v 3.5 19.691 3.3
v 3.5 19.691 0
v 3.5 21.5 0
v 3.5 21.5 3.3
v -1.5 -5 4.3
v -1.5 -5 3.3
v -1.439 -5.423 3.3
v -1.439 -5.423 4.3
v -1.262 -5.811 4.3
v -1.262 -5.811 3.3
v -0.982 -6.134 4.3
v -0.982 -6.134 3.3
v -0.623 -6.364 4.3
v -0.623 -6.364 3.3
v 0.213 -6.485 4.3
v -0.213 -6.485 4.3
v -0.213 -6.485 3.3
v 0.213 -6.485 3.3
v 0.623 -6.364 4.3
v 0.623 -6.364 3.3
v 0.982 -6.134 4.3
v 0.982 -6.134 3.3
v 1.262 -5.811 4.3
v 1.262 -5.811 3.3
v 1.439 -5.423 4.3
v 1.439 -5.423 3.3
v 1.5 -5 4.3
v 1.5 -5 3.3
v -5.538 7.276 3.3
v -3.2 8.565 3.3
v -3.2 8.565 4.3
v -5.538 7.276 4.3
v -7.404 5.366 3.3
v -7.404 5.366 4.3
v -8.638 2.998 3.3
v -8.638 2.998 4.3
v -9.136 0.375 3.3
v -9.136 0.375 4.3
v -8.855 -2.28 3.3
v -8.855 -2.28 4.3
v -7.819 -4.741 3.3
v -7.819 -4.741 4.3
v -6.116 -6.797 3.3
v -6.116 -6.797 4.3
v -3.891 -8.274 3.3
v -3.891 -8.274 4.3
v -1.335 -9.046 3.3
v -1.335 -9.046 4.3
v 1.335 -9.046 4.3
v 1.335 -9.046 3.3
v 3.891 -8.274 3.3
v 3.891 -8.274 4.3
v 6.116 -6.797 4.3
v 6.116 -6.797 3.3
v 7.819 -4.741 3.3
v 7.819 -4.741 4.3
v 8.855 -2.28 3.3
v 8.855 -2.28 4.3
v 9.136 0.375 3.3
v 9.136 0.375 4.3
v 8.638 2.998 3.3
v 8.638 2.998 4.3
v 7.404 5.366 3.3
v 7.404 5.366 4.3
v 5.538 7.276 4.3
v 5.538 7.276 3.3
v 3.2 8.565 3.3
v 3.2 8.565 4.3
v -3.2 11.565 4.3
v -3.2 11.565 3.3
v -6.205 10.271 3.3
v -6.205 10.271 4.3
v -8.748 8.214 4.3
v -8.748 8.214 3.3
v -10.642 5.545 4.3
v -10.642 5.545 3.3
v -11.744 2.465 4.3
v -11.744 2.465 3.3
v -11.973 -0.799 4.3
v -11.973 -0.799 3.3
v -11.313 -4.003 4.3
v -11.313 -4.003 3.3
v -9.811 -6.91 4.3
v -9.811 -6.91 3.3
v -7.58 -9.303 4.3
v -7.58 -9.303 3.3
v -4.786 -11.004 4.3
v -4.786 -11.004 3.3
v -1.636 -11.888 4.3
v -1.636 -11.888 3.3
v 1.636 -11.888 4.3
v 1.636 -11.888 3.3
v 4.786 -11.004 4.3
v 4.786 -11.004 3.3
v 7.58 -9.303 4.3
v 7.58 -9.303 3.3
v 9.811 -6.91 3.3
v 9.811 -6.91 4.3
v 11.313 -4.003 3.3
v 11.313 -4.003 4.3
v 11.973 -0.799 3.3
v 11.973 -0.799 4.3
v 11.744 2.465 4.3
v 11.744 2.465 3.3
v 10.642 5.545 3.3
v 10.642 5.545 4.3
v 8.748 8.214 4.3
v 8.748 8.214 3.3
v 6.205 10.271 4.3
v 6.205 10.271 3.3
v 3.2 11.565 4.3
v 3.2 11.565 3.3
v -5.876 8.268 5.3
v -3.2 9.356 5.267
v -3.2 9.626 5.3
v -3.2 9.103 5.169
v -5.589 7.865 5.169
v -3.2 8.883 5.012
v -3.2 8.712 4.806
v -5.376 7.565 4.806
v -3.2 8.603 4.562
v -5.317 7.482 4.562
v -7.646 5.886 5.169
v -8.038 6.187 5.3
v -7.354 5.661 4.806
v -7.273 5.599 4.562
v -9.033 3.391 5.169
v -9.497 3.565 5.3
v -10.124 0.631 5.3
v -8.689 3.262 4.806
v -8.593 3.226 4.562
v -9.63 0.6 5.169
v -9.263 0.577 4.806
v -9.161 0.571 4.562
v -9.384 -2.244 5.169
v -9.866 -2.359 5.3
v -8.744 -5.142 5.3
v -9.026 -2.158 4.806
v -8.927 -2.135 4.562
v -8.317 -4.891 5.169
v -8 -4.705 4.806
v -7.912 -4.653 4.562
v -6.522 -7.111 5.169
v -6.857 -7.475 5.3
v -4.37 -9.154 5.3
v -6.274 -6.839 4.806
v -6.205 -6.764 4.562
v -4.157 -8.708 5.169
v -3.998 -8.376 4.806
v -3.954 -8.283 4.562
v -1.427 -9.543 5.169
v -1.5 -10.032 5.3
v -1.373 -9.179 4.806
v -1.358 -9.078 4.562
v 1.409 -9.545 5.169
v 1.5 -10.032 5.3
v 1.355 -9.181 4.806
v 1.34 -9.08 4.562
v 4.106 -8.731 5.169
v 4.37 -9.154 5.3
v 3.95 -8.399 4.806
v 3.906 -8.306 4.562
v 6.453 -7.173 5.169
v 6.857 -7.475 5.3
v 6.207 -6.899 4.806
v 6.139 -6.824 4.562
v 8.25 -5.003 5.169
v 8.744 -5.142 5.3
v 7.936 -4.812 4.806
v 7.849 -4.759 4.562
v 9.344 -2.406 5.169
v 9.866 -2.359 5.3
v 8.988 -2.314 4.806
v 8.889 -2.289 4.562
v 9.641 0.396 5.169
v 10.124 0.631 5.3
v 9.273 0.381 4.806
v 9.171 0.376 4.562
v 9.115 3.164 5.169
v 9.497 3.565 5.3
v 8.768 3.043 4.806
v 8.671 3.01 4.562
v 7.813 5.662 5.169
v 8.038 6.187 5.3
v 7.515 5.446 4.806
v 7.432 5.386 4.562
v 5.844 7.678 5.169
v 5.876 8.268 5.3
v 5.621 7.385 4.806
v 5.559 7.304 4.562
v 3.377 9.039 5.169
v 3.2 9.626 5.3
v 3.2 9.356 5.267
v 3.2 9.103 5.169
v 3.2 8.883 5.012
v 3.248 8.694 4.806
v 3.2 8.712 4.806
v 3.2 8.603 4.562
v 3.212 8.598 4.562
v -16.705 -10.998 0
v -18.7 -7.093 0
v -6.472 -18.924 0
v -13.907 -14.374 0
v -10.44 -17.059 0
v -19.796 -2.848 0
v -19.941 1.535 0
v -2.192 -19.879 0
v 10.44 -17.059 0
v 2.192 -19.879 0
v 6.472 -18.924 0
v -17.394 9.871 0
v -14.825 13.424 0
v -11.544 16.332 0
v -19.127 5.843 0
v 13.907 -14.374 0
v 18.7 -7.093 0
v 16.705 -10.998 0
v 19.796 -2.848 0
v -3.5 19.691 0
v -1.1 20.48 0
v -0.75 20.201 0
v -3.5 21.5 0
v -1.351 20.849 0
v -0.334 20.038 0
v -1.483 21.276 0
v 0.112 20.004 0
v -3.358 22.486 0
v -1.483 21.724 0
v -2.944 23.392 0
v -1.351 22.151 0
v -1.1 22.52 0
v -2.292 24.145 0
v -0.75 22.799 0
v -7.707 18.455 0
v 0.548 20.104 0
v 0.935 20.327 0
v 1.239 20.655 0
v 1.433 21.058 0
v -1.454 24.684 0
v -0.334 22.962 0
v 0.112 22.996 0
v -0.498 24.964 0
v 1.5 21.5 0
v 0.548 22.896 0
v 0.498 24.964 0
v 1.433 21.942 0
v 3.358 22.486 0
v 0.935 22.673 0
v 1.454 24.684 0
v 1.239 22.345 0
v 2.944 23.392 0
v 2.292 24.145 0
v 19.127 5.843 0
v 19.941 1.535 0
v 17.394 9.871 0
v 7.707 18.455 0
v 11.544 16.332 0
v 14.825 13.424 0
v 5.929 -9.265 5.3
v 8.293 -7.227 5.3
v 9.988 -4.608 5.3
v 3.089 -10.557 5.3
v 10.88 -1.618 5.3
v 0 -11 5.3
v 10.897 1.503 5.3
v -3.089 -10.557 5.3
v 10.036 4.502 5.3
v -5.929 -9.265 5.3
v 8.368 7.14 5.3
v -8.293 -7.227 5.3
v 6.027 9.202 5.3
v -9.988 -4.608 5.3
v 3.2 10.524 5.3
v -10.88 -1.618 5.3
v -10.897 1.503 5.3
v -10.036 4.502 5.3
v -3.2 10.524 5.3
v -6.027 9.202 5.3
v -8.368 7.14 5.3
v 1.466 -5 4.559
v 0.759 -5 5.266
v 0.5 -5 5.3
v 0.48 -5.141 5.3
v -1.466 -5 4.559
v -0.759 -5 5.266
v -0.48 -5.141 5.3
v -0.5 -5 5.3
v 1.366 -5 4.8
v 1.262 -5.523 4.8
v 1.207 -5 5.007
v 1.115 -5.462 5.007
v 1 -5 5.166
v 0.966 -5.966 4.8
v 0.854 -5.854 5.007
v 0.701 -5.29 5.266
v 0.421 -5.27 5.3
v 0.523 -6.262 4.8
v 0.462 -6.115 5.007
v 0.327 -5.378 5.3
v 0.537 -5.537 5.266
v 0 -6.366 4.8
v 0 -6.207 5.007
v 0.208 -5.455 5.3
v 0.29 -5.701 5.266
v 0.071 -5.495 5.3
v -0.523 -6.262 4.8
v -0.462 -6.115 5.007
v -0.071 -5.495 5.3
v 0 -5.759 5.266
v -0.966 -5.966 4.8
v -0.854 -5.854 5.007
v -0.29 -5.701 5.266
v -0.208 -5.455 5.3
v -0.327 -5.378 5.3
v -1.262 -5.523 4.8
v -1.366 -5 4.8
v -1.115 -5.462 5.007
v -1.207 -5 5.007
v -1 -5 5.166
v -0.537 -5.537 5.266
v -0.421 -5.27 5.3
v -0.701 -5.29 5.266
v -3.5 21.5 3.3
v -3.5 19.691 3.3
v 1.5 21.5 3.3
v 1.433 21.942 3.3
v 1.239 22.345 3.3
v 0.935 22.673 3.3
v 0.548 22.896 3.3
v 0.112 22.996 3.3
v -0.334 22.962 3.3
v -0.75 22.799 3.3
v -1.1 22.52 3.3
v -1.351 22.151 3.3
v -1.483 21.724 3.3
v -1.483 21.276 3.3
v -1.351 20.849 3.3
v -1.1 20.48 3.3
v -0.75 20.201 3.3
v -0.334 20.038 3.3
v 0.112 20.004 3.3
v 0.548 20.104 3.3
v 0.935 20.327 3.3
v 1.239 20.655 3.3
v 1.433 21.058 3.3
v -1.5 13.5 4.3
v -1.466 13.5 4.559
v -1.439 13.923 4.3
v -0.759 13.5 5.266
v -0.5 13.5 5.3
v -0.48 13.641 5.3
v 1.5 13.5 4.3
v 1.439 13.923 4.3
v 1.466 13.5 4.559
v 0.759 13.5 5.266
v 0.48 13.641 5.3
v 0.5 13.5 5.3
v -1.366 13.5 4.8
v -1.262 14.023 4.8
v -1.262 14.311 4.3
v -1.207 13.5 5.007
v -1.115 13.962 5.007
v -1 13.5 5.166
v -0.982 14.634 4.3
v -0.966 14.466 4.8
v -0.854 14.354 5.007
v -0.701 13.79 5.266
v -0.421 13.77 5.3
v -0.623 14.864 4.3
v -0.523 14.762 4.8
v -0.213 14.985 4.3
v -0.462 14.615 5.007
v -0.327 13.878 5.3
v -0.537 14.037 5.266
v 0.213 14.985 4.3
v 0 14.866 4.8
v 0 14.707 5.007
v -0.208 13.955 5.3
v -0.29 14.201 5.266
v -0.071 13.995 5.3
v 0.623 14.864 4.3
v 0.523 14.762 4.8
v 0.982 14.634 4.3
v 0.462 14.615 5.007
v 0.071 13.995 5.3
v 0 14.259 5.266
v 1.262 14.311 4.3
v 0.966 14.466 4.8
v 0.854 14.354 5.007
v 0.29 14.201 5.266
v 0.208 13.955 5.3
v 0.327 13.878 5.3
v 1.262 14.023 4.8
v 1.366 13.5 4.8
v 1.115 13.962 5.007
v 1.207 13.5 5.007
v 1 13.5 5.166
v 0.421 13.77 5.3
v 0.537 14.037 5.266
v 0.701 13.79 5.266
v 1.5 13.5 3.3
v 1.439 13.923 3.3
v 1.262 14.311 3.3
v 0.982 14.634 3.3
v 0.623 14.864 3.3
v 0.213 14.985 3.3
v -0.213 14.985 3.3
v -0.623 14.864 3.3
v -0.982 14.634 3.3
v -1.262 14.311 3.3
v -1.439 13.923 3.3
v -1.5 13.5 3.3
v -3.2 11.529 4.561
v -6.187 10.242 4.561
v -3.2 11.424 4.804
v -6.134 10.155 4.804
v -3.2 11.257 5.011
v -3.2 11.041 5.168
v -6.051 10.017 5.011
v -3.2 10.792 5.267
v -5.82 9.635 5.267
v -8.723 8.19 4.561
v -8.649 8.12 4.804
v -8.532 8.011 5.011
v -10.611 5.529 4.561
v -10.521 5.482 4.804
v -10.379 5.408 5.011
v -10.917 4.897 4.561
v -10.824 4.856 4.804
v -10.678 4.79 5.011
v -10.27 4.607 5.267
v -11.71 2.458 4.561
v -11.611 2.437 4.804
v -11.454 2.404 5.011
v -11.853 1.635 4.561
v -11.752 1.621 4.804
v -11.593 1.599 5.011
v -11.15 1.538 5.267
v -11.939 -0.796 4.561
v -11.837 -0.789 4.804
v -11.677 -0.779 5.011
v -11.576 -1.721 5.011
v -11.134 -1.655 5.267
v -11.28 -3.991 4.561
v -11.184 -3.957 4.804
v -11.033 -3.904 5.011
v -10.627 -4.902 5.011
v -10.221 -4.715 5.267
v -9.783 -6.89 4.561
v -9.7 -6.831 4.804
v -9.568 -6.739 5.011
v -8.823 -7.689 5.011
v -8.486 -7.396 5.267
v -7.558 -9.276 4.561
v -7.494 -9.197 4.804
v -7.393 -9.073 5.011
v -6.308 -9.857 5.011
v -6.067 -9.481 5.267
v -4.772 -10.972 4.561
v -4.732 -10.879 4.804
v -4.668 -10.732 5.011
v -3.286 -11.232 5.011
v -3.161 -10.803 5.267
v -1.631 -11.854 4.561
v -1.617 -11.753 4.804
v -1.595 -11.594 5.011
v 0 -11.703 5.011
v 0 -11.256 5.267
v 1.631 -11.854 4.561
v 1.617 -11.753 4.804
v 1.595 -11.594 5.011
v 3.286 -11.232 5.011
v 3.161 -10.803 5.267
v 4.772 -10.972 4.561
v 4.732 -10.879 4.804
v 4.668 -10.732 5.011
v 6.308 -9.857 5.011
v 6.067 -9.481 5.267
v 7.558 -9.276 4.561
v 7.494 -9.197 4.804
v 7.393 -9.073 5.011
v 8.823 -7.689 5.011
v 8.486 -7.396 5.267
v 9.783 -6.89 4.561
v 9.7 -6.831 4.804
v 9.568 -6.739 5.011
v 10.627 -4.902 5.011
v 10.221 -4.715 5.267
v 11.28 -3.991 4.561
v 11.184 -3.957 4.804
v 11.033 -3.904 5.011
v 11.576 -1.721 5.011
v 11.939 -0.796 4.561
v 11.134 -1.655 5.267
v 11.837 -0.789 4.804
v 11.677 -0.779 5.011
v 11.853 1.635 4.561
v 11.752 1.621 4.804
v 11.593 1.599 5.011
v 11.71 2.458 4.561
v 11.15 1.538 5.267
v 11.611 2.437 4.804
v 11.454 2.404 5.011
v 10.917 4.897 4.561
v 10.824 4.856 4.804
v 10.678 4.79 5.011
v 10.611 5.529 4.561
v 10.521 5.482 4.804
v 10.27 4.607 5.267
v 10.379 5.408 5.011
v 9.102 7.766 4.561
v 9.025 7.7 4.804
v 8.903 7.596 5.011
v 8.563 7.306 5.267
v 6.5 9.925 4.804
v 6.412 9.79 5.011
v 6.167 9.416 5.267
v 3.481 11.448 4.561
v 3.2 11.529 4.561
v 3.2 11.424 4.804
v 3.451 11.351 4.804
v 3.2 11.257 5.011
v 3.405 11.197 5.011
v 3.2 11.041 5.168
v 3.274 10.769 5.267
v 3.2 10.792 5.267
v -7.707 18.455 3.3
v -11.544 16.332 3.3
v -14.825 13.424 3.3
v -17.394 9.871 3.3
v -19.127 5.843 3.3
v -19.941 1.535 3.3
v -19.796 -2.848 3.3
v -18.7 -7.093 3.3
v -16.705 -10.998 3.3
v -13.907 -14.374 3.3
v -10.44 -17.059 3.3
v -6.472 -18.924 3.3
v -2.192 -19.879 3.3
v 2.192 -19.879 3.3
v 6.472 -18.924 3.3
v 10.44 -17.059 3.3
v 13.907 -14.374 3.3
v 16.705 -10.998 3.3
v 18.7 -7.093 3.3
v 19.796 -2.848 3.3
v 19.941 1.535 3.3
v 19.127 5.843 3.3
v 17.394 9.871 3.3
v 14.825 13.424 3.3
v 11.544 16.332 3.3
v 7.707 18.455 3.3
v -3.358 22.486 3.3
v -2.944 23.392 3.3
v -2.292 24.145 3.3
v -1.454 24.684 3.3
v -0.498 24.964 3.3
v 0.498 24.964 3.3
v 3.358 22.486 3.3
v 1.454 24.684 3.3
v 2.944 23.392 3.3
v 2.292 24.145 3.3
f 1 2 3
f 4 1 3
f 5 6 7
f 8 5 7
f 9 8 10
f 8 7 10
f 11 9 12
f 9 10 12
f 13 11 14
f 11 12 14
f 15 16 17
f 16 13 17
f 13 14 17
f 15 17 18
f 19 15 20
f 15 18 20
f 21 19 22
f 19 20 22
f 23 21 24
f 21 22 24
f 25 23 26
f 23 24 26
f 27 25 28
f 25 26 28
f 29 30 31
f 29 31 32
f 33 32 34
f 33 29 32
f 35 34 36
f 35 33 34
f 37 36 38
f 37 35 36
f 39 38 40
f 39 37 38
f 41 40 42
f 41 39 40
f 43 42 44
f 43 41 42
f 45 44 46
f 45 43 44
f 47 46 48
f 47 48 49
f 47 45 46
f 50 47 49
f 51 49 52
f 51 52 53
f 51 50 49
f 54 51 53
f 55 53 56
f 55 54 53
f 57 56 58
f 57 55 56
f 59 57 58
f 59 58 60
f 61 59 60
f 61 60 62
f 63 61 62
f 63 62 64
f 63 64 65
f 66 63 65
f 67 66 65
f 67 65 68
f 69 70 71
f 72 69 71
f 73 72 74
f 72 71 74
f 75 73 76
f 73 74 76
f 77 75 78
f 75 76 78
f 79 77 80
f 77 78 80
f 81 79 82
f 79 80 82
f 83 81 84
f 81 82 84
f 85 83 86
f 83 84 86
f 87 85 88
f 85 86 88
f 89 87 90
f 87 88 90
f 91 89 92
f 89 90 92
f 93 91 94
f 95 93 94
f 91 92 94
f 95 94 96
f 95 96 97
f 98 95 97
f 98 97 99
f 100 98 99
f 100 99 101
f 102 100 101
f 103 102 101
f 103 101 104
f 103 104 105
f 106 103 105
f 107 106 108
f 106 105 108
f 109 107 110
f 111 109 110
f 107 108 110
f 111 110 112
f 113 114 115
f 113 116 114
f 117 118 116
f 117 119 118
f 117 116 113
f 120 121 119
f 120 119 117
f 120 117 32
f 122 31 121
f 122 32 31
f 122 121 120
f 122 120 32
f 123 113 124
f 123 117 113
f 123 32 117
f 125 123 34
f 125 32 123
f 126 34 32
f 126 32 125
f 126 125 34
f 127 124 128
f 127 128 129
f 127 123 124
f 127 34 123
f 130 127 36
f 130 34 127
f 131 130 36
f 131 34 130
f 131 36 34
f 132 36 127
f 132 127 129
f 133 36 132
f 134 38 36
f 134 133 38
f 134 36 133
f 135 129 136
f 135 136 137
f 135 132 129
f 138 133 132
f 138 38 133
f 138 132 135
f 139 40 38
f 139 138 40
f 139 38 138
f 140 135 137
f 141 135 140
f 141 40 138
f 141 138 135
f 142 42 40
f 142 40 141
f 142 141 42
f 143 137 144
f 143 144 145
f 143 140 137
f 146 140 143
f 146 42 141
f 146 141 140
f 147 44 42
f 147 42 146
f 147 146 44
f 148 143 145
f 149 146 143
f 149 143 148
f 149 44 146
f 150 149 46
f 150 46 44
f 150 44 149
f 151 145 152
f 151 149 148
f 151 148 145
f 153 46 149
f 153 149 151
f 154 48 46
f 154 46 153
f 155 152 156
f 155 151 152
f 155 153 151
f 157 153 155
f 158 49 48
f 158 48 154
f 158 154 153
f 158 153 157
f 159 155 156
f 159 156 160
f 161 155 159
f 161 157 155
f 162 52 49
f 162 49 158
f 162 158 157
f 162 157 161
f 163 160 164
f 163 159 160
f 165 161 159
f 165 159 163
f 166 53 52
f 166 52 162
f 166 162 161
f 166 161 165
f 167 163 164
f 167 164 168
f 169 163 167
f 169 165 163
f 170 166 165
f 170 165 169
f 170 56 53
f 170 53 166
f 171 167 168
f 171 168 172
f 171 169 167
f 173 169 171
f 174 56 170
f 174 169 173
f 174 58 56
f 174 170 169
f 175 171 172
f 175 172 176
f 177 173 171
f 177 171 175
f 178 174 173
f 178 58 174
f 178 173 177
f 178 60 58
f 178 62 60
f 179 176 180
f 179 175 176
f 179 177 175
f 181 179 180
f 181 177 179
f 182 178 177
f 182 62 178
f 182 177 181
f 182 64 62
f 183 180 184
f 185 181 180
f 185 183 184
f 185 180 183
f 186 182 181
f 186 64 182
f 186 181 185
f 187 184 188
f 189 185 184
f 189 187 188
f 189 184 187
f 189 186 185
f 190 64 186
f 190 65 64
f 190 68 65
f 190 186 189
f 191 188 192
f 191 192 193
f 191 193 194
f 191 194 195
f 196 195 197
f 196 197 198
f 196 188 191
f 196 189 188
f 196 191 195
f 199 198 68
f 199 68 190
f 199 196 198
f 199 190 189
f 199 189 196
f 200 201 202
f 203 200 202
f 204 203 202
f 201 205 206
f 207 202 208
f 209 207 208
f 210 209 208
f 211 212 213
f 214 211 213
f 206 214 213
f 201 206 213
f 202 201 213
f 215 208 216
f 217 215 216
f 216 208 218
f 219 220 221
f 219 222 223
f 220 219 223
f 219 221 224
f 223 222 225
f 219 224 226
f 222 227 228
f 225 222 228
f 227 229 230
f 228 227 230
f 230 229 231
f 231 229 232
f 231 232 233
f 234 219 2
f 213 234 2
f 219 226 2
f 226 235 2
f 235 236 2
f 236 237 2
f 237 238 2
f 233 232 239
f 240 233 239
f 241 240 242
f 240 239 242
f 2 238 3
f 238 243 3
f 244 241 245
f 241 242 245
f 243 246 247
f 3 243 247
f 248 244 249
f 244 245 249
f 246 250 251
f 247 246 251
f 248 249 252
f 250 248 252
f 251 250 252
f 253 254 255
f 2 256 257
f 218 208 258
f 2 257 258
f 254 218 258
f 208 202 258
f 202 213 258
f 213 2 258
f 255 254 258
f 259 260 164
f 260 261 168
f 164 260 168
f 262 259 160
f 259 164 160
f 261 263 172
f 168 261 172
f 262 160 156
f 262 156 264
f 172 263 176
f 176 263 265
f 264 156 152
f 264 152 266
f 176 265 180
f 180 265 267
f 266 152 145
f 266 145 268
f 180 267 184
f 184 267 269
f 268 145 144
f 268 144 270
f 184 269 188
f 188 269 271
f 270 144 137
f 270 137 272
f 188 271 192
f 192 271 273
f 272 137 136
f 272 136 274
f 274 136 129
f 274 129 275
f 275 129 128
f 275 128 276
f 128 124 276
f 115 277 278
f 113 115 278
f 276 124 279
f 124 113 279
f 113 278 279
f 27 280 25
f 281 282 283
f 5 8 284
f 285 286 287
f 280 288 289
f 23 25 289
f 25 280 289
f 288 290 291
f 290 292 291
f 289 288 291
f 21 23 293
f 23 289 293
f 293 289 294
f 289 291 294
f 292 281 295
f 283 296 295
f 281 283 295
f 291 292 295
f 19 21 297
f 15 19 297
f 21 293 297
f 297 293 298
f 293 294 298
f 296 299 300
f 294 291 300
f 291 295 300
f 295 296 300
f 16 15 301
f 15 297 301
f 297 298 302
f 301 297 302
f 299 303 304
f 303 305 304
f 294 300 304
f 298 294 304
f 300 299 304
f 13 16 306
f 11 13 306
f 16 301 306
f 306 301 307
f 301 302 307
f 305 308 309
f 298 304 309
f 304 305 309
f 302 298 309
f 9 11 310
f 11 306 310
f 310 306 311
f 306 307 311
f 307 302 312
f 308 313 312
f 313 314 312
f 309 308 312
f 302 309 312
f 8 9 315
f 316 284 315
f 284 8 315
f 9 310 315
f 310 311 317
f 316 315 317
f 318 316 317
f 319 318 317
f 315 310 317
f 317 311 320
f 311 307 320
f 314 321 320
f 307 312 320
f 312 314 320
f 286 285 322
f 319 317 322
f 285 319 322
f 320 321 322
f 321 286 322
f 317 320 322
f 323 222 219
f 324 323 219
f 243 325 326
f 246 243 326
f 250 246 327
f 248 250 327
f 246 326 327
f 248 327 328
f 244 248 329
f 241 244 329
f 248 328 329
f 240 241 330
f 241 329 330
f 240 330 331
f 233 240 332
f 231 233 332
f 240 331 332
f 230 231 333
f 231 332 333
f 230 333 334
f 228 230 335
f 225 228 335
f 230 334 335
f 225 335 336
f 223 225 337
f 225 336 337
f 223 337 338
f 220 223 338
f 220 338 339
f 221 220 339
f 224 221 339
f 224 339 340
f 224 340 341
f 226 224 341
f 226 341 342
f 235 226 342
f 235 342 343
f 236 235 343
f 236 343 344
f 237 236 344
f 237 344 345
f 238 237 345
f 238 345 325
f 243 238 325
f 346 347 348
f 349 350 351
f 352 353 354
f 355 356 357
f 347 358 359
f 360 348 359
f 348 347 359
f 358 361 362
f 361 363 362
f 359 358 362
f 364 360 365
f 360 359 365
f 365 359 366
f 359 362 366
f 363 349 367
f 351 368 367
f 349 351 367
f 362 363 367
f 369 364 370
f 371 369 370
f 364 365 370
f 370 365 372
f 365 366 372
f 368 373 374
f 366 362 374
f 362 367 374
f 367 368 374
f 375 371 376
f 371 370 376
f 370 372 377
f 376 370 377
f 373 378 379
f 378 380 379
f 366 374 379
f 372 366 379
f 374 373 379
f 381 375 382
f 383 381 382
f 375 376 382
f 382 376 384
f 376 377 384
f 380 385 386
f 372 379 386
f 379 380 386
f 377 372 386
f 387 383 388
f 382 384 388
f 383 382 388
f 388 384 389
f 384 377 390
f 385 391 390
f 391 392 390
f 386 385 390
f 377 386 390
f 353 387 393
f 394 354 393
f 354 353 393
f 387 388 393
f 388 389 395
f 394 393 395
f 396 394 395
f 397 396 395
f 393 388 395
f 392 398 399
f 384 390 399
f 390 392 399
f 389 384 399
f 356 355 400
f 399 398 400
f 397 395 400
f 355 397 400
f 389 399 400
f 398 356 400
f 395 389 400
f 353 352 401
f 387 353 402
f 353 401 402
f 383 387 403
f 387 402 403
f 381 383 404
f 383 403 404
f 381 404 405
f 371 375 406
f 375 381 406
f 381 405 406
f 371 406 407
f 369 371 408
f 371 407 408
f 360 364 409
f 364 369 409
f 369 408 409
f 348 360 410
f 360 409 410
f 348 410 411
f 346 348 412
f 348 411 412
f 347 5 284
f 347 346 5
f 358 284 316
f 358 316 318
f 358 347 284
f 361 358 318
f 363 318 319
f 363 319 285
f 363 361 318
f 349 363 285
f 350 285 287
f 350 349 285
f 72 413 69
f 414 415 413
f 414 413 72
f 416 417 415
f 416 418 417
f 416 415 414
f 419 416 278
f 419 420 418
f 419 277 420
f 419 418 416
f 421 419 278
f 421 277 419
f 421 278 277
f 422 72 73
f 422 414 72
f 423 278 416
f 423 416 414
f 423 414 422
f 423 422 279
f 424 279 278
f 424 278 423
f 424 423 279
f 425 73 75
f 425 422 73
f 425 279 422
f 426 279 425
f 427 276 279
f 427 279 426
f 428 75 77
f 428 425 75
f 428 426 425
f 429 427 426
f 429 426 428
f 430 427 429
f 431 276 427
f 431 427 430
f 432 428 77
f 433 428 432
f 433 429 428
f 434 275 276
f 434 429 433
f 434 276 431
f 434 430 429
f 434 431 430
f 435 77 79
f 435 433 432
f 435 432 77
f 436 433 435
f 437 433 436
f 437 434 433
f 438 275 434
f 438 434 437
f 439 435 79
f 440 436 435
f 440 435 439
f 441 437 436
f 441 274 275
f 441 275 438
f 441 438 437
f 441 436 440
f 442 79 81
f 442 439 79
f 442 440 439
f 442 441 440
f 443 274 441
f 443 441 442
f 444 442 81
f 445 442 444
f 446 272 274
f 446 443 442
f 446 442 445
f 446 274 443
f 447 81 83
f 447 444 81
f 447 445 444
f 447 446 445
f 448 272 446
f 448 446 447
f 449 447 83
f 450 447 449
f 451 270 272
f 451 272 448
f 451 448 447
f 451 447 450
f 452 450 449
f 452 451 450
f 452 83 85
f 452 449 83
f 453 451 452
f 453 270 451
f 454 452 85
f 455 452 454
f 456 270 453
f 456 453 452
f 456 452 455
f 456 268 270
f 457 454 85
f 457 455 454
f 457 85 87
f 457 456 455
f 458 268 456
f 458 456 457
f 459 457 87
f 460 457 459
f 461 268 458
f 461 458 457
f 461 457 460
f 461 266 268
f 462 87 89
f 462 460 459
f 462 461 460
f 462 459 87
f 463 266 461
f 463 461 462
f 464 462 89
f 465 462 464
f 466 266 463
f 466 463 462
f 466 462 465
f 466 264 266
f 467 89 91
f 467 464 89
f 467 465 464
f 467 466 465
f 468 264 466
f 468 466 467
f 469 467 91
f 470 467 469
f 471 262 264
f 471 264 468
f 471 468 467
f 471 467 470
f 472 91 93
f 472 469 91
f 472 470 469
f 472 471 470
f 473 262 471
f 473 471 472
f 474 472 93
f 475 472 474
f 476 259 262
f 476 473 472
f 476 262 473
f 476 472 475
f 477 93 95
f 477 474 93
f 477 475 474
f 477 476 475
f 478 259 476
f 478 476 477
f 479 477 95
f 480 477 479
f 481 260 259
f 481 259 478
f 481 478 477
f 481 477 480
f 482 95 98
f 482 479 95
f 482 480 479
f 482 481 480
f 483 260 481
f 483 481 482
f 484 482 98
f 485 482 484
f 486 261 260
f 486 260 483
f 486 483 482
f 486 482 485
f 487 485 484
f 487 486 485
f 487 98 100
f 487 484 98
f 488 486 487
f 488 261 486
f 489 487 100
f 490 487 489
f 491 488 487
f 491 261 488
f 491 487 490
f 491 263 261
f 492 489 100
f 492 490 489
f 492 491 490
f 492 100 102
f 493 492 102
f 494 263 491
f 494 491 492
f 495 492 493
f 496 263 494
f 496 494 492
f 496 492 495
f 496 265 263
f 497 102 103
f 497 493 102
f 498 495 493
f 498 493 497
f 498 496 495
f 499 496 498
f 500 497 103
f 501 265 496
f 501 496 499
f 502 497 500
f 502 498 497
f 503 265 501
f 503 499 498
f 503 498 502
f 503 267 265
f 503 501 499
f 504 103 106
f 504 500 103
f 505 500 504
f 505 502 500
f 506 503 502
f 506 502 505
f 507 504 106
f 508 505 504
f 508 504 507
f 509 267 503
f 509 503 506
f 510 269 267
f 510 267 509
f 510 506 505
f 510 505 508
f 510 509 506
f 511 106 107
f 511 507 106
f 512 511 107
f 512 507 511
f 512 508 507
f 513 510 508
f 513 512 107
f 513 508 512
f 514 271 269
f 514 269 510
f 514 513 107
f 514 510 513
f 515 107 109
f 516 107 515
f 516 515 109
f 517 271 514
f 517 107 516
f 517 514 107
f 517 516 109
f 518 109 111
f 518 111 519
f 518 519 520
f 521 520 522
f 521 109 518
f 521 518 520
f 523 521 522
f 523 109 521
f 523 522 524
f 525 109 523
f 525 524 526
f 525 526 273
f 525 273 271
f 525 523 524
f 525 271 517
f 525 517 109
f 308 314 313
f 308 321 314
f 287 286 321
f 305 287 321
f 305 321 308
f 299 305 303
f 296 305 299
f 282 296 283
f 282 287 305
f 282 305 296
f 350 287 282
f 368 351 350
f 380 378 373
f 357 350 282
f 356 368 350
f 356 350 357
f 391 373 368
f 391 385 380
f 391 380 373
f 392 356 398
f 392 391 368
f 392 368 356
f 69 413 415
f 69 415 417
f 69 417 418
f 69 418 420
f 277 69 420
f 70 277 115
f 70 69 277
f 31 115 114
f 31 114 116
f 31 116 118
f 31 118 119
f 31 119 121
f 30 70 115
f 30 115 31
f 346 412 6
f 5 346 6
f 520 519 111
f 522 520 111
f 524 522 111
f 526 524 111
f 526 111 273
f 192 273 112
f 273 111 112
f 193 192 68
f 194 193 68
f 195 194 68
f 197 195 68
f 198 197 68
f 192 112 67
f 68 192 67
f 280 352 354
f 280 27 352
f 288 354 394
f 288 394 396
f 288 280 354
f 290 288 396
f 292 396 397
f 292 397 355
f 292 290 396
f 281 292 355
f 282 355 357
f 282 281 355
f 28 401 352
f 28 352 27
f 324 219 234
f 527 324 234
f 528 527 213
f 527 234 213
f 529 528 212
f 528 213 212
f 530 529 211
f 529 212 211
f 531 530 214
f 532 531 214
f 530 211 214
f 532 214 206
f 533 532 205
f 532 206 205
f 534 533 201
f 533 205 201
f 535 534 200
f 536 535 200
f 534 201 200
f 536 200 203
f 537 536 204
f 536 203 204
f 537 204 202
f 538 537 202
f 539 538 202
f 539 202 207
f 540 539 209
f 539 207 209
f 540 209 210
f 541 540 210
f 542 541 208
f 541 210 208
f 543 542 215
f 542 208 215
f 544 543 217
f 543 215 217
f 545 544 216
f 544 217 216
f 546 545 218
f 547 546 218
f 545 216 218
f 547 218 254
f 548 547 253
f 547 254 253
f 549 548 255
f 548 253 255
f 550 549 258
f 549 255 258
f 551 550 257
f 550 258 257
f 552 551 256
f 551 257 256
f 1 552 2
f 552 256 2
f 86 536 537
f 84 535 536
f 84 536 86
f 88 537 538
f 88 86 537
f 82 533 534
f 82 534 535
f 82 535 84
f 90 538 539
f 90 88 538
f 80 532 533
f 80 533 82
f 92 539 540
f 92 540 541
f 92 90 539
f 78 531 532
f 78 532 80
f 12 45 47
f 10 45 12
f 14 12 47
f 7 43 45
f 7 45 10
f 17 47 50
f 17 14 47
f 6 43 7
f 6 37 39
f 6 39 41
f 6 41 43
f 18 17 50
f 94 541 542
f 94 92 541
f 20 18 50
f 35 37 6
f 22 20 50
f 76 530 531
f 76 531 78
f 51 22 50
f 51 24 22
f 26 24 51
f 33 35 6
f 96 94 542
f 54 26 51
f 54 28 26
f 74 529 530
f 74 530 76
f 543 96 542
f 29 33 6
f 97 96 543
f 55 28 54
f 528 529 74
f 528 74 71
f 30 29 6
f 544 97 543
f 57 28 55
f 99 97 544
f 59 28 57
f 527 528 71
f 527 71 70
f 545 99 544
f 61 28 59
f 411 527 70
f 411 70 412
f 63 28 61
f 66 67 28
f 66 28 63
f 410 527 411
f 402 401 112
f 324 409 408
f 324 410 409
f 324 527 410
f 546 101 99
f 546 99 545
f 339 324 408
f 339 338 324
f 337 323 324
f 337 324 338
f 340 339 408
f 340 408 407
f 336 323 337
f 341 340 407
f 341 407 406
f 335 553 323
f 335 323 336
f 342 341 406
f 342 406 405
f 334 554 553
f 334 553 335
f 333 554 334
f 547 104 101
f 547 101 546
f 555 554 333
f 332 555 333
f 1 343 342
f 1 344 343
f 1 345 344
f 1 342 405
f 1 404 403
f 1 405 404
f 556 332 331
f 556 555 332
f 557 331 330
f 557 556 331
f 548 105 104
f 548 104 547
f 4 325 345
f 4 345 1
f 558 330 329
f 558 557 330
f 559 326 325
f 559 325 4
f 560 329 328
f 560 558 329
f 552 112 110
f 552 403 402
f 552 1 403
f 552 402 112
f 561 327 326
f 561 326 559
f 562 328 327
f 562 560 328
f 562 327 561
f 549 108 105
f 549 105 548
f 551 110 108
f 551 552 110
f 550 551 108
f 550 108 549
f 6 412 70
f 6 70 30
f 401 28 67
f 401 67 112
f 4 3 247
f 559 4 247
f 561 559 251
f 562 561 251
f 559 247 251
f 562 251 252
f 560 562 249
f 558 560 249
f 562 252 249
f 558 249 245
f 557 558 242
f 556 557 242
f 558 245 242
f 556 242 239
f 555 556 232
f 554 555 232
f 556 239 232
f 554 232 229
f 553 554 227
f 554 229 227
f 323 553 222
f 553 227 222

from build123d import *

# Parameters (mm, degrees)
EXTRUDE_DEPTH = 3.3
SKETCH001_R   = 1.5
POCKET_DEPTH  = 3.301
PAD_DEPTH     = 2
FILLET_R      = 1
FILLET001_R   = 1
FILLET002_R   = 1


with BuildPart() as part:
    # Sketch → Extrude (new body)
    with BuildSketch(Plane.XY):
        with BuildLine():
            ThreePointArc((3.5, 21.5), (0, 25), (-3.5, 21.5))
            Line((-3.5, 21.5), (-3.5, 19.691369))
            ThreePointArc((-3.5, 19.691369), (0, -20), (3.5, 19.691369))
            Line((3.5, 19.691369), (3.5, 21.5))
        make_face()
    extrude(amount=EXTRUDE_DEPTH)

    # Sketch001 → Pocket (cut, through all)
    with BuildSketch(Plane.XY.offset(3.3)):
        with Locations((0, 21.5)):
            Circle(SKETCH001_R)
    extrude(amount=-POCKET_DEPTH, mode=Mode.SUBTRACT)

    # Sketch002 → Pad (new body)
    with BuildSketch(Plane.XY.offset(3.3)):
        with BuildLine():
            Line((-1.5, 13.5), (-1.5, -5))
            ThreePointArc((-1.5, -5), (0, -6.5), (1.5, -5))
            Line((1.5, 13.5), (1.5, -5))
            ThreePointArc((1.5, 13.5), (0, 15.000005), (-1.5, 13.5))
        make_face()
        with BuildLine():
            ThreePointArc((-3.2, 8.565466), (0, -9.143698), (3.2, 8.565466))
            Line((3.2, 11.565466), (3.2, 8.565466))
            ThreePointArc((-3.2, 11.565466), (0, -12), (3.2, 11.565466))
            Line((-3.2, 11.565466), (-3.2, 8.565466))
        make_face()
    extrude(amount=PAD_DEPTH)

    # Fillet
    fillet_edges = [part.edges().sort_by_distance(p)[0] for p in [
        (0, -12, 5.3),
    ]]
    fillet(fillet_edges, radius=FILLET_R)

    # Fillet001
    fillet001_edges = [part.edges().sort_by_distance(p)[0] for p in [
        (0, -9.143698, 5.3),
    ]]
    fillet(fillet001_edges, radius=FILLET001_R)

    # Fillet002
    fillet002_edges = [part.edges().sort_by_distance(p)[0] for p in [
        (1.5, 4.25, 5.3),
    ]]
    fillet(fillet002_edges, radius=FILLET002_R)


solid = part.part
